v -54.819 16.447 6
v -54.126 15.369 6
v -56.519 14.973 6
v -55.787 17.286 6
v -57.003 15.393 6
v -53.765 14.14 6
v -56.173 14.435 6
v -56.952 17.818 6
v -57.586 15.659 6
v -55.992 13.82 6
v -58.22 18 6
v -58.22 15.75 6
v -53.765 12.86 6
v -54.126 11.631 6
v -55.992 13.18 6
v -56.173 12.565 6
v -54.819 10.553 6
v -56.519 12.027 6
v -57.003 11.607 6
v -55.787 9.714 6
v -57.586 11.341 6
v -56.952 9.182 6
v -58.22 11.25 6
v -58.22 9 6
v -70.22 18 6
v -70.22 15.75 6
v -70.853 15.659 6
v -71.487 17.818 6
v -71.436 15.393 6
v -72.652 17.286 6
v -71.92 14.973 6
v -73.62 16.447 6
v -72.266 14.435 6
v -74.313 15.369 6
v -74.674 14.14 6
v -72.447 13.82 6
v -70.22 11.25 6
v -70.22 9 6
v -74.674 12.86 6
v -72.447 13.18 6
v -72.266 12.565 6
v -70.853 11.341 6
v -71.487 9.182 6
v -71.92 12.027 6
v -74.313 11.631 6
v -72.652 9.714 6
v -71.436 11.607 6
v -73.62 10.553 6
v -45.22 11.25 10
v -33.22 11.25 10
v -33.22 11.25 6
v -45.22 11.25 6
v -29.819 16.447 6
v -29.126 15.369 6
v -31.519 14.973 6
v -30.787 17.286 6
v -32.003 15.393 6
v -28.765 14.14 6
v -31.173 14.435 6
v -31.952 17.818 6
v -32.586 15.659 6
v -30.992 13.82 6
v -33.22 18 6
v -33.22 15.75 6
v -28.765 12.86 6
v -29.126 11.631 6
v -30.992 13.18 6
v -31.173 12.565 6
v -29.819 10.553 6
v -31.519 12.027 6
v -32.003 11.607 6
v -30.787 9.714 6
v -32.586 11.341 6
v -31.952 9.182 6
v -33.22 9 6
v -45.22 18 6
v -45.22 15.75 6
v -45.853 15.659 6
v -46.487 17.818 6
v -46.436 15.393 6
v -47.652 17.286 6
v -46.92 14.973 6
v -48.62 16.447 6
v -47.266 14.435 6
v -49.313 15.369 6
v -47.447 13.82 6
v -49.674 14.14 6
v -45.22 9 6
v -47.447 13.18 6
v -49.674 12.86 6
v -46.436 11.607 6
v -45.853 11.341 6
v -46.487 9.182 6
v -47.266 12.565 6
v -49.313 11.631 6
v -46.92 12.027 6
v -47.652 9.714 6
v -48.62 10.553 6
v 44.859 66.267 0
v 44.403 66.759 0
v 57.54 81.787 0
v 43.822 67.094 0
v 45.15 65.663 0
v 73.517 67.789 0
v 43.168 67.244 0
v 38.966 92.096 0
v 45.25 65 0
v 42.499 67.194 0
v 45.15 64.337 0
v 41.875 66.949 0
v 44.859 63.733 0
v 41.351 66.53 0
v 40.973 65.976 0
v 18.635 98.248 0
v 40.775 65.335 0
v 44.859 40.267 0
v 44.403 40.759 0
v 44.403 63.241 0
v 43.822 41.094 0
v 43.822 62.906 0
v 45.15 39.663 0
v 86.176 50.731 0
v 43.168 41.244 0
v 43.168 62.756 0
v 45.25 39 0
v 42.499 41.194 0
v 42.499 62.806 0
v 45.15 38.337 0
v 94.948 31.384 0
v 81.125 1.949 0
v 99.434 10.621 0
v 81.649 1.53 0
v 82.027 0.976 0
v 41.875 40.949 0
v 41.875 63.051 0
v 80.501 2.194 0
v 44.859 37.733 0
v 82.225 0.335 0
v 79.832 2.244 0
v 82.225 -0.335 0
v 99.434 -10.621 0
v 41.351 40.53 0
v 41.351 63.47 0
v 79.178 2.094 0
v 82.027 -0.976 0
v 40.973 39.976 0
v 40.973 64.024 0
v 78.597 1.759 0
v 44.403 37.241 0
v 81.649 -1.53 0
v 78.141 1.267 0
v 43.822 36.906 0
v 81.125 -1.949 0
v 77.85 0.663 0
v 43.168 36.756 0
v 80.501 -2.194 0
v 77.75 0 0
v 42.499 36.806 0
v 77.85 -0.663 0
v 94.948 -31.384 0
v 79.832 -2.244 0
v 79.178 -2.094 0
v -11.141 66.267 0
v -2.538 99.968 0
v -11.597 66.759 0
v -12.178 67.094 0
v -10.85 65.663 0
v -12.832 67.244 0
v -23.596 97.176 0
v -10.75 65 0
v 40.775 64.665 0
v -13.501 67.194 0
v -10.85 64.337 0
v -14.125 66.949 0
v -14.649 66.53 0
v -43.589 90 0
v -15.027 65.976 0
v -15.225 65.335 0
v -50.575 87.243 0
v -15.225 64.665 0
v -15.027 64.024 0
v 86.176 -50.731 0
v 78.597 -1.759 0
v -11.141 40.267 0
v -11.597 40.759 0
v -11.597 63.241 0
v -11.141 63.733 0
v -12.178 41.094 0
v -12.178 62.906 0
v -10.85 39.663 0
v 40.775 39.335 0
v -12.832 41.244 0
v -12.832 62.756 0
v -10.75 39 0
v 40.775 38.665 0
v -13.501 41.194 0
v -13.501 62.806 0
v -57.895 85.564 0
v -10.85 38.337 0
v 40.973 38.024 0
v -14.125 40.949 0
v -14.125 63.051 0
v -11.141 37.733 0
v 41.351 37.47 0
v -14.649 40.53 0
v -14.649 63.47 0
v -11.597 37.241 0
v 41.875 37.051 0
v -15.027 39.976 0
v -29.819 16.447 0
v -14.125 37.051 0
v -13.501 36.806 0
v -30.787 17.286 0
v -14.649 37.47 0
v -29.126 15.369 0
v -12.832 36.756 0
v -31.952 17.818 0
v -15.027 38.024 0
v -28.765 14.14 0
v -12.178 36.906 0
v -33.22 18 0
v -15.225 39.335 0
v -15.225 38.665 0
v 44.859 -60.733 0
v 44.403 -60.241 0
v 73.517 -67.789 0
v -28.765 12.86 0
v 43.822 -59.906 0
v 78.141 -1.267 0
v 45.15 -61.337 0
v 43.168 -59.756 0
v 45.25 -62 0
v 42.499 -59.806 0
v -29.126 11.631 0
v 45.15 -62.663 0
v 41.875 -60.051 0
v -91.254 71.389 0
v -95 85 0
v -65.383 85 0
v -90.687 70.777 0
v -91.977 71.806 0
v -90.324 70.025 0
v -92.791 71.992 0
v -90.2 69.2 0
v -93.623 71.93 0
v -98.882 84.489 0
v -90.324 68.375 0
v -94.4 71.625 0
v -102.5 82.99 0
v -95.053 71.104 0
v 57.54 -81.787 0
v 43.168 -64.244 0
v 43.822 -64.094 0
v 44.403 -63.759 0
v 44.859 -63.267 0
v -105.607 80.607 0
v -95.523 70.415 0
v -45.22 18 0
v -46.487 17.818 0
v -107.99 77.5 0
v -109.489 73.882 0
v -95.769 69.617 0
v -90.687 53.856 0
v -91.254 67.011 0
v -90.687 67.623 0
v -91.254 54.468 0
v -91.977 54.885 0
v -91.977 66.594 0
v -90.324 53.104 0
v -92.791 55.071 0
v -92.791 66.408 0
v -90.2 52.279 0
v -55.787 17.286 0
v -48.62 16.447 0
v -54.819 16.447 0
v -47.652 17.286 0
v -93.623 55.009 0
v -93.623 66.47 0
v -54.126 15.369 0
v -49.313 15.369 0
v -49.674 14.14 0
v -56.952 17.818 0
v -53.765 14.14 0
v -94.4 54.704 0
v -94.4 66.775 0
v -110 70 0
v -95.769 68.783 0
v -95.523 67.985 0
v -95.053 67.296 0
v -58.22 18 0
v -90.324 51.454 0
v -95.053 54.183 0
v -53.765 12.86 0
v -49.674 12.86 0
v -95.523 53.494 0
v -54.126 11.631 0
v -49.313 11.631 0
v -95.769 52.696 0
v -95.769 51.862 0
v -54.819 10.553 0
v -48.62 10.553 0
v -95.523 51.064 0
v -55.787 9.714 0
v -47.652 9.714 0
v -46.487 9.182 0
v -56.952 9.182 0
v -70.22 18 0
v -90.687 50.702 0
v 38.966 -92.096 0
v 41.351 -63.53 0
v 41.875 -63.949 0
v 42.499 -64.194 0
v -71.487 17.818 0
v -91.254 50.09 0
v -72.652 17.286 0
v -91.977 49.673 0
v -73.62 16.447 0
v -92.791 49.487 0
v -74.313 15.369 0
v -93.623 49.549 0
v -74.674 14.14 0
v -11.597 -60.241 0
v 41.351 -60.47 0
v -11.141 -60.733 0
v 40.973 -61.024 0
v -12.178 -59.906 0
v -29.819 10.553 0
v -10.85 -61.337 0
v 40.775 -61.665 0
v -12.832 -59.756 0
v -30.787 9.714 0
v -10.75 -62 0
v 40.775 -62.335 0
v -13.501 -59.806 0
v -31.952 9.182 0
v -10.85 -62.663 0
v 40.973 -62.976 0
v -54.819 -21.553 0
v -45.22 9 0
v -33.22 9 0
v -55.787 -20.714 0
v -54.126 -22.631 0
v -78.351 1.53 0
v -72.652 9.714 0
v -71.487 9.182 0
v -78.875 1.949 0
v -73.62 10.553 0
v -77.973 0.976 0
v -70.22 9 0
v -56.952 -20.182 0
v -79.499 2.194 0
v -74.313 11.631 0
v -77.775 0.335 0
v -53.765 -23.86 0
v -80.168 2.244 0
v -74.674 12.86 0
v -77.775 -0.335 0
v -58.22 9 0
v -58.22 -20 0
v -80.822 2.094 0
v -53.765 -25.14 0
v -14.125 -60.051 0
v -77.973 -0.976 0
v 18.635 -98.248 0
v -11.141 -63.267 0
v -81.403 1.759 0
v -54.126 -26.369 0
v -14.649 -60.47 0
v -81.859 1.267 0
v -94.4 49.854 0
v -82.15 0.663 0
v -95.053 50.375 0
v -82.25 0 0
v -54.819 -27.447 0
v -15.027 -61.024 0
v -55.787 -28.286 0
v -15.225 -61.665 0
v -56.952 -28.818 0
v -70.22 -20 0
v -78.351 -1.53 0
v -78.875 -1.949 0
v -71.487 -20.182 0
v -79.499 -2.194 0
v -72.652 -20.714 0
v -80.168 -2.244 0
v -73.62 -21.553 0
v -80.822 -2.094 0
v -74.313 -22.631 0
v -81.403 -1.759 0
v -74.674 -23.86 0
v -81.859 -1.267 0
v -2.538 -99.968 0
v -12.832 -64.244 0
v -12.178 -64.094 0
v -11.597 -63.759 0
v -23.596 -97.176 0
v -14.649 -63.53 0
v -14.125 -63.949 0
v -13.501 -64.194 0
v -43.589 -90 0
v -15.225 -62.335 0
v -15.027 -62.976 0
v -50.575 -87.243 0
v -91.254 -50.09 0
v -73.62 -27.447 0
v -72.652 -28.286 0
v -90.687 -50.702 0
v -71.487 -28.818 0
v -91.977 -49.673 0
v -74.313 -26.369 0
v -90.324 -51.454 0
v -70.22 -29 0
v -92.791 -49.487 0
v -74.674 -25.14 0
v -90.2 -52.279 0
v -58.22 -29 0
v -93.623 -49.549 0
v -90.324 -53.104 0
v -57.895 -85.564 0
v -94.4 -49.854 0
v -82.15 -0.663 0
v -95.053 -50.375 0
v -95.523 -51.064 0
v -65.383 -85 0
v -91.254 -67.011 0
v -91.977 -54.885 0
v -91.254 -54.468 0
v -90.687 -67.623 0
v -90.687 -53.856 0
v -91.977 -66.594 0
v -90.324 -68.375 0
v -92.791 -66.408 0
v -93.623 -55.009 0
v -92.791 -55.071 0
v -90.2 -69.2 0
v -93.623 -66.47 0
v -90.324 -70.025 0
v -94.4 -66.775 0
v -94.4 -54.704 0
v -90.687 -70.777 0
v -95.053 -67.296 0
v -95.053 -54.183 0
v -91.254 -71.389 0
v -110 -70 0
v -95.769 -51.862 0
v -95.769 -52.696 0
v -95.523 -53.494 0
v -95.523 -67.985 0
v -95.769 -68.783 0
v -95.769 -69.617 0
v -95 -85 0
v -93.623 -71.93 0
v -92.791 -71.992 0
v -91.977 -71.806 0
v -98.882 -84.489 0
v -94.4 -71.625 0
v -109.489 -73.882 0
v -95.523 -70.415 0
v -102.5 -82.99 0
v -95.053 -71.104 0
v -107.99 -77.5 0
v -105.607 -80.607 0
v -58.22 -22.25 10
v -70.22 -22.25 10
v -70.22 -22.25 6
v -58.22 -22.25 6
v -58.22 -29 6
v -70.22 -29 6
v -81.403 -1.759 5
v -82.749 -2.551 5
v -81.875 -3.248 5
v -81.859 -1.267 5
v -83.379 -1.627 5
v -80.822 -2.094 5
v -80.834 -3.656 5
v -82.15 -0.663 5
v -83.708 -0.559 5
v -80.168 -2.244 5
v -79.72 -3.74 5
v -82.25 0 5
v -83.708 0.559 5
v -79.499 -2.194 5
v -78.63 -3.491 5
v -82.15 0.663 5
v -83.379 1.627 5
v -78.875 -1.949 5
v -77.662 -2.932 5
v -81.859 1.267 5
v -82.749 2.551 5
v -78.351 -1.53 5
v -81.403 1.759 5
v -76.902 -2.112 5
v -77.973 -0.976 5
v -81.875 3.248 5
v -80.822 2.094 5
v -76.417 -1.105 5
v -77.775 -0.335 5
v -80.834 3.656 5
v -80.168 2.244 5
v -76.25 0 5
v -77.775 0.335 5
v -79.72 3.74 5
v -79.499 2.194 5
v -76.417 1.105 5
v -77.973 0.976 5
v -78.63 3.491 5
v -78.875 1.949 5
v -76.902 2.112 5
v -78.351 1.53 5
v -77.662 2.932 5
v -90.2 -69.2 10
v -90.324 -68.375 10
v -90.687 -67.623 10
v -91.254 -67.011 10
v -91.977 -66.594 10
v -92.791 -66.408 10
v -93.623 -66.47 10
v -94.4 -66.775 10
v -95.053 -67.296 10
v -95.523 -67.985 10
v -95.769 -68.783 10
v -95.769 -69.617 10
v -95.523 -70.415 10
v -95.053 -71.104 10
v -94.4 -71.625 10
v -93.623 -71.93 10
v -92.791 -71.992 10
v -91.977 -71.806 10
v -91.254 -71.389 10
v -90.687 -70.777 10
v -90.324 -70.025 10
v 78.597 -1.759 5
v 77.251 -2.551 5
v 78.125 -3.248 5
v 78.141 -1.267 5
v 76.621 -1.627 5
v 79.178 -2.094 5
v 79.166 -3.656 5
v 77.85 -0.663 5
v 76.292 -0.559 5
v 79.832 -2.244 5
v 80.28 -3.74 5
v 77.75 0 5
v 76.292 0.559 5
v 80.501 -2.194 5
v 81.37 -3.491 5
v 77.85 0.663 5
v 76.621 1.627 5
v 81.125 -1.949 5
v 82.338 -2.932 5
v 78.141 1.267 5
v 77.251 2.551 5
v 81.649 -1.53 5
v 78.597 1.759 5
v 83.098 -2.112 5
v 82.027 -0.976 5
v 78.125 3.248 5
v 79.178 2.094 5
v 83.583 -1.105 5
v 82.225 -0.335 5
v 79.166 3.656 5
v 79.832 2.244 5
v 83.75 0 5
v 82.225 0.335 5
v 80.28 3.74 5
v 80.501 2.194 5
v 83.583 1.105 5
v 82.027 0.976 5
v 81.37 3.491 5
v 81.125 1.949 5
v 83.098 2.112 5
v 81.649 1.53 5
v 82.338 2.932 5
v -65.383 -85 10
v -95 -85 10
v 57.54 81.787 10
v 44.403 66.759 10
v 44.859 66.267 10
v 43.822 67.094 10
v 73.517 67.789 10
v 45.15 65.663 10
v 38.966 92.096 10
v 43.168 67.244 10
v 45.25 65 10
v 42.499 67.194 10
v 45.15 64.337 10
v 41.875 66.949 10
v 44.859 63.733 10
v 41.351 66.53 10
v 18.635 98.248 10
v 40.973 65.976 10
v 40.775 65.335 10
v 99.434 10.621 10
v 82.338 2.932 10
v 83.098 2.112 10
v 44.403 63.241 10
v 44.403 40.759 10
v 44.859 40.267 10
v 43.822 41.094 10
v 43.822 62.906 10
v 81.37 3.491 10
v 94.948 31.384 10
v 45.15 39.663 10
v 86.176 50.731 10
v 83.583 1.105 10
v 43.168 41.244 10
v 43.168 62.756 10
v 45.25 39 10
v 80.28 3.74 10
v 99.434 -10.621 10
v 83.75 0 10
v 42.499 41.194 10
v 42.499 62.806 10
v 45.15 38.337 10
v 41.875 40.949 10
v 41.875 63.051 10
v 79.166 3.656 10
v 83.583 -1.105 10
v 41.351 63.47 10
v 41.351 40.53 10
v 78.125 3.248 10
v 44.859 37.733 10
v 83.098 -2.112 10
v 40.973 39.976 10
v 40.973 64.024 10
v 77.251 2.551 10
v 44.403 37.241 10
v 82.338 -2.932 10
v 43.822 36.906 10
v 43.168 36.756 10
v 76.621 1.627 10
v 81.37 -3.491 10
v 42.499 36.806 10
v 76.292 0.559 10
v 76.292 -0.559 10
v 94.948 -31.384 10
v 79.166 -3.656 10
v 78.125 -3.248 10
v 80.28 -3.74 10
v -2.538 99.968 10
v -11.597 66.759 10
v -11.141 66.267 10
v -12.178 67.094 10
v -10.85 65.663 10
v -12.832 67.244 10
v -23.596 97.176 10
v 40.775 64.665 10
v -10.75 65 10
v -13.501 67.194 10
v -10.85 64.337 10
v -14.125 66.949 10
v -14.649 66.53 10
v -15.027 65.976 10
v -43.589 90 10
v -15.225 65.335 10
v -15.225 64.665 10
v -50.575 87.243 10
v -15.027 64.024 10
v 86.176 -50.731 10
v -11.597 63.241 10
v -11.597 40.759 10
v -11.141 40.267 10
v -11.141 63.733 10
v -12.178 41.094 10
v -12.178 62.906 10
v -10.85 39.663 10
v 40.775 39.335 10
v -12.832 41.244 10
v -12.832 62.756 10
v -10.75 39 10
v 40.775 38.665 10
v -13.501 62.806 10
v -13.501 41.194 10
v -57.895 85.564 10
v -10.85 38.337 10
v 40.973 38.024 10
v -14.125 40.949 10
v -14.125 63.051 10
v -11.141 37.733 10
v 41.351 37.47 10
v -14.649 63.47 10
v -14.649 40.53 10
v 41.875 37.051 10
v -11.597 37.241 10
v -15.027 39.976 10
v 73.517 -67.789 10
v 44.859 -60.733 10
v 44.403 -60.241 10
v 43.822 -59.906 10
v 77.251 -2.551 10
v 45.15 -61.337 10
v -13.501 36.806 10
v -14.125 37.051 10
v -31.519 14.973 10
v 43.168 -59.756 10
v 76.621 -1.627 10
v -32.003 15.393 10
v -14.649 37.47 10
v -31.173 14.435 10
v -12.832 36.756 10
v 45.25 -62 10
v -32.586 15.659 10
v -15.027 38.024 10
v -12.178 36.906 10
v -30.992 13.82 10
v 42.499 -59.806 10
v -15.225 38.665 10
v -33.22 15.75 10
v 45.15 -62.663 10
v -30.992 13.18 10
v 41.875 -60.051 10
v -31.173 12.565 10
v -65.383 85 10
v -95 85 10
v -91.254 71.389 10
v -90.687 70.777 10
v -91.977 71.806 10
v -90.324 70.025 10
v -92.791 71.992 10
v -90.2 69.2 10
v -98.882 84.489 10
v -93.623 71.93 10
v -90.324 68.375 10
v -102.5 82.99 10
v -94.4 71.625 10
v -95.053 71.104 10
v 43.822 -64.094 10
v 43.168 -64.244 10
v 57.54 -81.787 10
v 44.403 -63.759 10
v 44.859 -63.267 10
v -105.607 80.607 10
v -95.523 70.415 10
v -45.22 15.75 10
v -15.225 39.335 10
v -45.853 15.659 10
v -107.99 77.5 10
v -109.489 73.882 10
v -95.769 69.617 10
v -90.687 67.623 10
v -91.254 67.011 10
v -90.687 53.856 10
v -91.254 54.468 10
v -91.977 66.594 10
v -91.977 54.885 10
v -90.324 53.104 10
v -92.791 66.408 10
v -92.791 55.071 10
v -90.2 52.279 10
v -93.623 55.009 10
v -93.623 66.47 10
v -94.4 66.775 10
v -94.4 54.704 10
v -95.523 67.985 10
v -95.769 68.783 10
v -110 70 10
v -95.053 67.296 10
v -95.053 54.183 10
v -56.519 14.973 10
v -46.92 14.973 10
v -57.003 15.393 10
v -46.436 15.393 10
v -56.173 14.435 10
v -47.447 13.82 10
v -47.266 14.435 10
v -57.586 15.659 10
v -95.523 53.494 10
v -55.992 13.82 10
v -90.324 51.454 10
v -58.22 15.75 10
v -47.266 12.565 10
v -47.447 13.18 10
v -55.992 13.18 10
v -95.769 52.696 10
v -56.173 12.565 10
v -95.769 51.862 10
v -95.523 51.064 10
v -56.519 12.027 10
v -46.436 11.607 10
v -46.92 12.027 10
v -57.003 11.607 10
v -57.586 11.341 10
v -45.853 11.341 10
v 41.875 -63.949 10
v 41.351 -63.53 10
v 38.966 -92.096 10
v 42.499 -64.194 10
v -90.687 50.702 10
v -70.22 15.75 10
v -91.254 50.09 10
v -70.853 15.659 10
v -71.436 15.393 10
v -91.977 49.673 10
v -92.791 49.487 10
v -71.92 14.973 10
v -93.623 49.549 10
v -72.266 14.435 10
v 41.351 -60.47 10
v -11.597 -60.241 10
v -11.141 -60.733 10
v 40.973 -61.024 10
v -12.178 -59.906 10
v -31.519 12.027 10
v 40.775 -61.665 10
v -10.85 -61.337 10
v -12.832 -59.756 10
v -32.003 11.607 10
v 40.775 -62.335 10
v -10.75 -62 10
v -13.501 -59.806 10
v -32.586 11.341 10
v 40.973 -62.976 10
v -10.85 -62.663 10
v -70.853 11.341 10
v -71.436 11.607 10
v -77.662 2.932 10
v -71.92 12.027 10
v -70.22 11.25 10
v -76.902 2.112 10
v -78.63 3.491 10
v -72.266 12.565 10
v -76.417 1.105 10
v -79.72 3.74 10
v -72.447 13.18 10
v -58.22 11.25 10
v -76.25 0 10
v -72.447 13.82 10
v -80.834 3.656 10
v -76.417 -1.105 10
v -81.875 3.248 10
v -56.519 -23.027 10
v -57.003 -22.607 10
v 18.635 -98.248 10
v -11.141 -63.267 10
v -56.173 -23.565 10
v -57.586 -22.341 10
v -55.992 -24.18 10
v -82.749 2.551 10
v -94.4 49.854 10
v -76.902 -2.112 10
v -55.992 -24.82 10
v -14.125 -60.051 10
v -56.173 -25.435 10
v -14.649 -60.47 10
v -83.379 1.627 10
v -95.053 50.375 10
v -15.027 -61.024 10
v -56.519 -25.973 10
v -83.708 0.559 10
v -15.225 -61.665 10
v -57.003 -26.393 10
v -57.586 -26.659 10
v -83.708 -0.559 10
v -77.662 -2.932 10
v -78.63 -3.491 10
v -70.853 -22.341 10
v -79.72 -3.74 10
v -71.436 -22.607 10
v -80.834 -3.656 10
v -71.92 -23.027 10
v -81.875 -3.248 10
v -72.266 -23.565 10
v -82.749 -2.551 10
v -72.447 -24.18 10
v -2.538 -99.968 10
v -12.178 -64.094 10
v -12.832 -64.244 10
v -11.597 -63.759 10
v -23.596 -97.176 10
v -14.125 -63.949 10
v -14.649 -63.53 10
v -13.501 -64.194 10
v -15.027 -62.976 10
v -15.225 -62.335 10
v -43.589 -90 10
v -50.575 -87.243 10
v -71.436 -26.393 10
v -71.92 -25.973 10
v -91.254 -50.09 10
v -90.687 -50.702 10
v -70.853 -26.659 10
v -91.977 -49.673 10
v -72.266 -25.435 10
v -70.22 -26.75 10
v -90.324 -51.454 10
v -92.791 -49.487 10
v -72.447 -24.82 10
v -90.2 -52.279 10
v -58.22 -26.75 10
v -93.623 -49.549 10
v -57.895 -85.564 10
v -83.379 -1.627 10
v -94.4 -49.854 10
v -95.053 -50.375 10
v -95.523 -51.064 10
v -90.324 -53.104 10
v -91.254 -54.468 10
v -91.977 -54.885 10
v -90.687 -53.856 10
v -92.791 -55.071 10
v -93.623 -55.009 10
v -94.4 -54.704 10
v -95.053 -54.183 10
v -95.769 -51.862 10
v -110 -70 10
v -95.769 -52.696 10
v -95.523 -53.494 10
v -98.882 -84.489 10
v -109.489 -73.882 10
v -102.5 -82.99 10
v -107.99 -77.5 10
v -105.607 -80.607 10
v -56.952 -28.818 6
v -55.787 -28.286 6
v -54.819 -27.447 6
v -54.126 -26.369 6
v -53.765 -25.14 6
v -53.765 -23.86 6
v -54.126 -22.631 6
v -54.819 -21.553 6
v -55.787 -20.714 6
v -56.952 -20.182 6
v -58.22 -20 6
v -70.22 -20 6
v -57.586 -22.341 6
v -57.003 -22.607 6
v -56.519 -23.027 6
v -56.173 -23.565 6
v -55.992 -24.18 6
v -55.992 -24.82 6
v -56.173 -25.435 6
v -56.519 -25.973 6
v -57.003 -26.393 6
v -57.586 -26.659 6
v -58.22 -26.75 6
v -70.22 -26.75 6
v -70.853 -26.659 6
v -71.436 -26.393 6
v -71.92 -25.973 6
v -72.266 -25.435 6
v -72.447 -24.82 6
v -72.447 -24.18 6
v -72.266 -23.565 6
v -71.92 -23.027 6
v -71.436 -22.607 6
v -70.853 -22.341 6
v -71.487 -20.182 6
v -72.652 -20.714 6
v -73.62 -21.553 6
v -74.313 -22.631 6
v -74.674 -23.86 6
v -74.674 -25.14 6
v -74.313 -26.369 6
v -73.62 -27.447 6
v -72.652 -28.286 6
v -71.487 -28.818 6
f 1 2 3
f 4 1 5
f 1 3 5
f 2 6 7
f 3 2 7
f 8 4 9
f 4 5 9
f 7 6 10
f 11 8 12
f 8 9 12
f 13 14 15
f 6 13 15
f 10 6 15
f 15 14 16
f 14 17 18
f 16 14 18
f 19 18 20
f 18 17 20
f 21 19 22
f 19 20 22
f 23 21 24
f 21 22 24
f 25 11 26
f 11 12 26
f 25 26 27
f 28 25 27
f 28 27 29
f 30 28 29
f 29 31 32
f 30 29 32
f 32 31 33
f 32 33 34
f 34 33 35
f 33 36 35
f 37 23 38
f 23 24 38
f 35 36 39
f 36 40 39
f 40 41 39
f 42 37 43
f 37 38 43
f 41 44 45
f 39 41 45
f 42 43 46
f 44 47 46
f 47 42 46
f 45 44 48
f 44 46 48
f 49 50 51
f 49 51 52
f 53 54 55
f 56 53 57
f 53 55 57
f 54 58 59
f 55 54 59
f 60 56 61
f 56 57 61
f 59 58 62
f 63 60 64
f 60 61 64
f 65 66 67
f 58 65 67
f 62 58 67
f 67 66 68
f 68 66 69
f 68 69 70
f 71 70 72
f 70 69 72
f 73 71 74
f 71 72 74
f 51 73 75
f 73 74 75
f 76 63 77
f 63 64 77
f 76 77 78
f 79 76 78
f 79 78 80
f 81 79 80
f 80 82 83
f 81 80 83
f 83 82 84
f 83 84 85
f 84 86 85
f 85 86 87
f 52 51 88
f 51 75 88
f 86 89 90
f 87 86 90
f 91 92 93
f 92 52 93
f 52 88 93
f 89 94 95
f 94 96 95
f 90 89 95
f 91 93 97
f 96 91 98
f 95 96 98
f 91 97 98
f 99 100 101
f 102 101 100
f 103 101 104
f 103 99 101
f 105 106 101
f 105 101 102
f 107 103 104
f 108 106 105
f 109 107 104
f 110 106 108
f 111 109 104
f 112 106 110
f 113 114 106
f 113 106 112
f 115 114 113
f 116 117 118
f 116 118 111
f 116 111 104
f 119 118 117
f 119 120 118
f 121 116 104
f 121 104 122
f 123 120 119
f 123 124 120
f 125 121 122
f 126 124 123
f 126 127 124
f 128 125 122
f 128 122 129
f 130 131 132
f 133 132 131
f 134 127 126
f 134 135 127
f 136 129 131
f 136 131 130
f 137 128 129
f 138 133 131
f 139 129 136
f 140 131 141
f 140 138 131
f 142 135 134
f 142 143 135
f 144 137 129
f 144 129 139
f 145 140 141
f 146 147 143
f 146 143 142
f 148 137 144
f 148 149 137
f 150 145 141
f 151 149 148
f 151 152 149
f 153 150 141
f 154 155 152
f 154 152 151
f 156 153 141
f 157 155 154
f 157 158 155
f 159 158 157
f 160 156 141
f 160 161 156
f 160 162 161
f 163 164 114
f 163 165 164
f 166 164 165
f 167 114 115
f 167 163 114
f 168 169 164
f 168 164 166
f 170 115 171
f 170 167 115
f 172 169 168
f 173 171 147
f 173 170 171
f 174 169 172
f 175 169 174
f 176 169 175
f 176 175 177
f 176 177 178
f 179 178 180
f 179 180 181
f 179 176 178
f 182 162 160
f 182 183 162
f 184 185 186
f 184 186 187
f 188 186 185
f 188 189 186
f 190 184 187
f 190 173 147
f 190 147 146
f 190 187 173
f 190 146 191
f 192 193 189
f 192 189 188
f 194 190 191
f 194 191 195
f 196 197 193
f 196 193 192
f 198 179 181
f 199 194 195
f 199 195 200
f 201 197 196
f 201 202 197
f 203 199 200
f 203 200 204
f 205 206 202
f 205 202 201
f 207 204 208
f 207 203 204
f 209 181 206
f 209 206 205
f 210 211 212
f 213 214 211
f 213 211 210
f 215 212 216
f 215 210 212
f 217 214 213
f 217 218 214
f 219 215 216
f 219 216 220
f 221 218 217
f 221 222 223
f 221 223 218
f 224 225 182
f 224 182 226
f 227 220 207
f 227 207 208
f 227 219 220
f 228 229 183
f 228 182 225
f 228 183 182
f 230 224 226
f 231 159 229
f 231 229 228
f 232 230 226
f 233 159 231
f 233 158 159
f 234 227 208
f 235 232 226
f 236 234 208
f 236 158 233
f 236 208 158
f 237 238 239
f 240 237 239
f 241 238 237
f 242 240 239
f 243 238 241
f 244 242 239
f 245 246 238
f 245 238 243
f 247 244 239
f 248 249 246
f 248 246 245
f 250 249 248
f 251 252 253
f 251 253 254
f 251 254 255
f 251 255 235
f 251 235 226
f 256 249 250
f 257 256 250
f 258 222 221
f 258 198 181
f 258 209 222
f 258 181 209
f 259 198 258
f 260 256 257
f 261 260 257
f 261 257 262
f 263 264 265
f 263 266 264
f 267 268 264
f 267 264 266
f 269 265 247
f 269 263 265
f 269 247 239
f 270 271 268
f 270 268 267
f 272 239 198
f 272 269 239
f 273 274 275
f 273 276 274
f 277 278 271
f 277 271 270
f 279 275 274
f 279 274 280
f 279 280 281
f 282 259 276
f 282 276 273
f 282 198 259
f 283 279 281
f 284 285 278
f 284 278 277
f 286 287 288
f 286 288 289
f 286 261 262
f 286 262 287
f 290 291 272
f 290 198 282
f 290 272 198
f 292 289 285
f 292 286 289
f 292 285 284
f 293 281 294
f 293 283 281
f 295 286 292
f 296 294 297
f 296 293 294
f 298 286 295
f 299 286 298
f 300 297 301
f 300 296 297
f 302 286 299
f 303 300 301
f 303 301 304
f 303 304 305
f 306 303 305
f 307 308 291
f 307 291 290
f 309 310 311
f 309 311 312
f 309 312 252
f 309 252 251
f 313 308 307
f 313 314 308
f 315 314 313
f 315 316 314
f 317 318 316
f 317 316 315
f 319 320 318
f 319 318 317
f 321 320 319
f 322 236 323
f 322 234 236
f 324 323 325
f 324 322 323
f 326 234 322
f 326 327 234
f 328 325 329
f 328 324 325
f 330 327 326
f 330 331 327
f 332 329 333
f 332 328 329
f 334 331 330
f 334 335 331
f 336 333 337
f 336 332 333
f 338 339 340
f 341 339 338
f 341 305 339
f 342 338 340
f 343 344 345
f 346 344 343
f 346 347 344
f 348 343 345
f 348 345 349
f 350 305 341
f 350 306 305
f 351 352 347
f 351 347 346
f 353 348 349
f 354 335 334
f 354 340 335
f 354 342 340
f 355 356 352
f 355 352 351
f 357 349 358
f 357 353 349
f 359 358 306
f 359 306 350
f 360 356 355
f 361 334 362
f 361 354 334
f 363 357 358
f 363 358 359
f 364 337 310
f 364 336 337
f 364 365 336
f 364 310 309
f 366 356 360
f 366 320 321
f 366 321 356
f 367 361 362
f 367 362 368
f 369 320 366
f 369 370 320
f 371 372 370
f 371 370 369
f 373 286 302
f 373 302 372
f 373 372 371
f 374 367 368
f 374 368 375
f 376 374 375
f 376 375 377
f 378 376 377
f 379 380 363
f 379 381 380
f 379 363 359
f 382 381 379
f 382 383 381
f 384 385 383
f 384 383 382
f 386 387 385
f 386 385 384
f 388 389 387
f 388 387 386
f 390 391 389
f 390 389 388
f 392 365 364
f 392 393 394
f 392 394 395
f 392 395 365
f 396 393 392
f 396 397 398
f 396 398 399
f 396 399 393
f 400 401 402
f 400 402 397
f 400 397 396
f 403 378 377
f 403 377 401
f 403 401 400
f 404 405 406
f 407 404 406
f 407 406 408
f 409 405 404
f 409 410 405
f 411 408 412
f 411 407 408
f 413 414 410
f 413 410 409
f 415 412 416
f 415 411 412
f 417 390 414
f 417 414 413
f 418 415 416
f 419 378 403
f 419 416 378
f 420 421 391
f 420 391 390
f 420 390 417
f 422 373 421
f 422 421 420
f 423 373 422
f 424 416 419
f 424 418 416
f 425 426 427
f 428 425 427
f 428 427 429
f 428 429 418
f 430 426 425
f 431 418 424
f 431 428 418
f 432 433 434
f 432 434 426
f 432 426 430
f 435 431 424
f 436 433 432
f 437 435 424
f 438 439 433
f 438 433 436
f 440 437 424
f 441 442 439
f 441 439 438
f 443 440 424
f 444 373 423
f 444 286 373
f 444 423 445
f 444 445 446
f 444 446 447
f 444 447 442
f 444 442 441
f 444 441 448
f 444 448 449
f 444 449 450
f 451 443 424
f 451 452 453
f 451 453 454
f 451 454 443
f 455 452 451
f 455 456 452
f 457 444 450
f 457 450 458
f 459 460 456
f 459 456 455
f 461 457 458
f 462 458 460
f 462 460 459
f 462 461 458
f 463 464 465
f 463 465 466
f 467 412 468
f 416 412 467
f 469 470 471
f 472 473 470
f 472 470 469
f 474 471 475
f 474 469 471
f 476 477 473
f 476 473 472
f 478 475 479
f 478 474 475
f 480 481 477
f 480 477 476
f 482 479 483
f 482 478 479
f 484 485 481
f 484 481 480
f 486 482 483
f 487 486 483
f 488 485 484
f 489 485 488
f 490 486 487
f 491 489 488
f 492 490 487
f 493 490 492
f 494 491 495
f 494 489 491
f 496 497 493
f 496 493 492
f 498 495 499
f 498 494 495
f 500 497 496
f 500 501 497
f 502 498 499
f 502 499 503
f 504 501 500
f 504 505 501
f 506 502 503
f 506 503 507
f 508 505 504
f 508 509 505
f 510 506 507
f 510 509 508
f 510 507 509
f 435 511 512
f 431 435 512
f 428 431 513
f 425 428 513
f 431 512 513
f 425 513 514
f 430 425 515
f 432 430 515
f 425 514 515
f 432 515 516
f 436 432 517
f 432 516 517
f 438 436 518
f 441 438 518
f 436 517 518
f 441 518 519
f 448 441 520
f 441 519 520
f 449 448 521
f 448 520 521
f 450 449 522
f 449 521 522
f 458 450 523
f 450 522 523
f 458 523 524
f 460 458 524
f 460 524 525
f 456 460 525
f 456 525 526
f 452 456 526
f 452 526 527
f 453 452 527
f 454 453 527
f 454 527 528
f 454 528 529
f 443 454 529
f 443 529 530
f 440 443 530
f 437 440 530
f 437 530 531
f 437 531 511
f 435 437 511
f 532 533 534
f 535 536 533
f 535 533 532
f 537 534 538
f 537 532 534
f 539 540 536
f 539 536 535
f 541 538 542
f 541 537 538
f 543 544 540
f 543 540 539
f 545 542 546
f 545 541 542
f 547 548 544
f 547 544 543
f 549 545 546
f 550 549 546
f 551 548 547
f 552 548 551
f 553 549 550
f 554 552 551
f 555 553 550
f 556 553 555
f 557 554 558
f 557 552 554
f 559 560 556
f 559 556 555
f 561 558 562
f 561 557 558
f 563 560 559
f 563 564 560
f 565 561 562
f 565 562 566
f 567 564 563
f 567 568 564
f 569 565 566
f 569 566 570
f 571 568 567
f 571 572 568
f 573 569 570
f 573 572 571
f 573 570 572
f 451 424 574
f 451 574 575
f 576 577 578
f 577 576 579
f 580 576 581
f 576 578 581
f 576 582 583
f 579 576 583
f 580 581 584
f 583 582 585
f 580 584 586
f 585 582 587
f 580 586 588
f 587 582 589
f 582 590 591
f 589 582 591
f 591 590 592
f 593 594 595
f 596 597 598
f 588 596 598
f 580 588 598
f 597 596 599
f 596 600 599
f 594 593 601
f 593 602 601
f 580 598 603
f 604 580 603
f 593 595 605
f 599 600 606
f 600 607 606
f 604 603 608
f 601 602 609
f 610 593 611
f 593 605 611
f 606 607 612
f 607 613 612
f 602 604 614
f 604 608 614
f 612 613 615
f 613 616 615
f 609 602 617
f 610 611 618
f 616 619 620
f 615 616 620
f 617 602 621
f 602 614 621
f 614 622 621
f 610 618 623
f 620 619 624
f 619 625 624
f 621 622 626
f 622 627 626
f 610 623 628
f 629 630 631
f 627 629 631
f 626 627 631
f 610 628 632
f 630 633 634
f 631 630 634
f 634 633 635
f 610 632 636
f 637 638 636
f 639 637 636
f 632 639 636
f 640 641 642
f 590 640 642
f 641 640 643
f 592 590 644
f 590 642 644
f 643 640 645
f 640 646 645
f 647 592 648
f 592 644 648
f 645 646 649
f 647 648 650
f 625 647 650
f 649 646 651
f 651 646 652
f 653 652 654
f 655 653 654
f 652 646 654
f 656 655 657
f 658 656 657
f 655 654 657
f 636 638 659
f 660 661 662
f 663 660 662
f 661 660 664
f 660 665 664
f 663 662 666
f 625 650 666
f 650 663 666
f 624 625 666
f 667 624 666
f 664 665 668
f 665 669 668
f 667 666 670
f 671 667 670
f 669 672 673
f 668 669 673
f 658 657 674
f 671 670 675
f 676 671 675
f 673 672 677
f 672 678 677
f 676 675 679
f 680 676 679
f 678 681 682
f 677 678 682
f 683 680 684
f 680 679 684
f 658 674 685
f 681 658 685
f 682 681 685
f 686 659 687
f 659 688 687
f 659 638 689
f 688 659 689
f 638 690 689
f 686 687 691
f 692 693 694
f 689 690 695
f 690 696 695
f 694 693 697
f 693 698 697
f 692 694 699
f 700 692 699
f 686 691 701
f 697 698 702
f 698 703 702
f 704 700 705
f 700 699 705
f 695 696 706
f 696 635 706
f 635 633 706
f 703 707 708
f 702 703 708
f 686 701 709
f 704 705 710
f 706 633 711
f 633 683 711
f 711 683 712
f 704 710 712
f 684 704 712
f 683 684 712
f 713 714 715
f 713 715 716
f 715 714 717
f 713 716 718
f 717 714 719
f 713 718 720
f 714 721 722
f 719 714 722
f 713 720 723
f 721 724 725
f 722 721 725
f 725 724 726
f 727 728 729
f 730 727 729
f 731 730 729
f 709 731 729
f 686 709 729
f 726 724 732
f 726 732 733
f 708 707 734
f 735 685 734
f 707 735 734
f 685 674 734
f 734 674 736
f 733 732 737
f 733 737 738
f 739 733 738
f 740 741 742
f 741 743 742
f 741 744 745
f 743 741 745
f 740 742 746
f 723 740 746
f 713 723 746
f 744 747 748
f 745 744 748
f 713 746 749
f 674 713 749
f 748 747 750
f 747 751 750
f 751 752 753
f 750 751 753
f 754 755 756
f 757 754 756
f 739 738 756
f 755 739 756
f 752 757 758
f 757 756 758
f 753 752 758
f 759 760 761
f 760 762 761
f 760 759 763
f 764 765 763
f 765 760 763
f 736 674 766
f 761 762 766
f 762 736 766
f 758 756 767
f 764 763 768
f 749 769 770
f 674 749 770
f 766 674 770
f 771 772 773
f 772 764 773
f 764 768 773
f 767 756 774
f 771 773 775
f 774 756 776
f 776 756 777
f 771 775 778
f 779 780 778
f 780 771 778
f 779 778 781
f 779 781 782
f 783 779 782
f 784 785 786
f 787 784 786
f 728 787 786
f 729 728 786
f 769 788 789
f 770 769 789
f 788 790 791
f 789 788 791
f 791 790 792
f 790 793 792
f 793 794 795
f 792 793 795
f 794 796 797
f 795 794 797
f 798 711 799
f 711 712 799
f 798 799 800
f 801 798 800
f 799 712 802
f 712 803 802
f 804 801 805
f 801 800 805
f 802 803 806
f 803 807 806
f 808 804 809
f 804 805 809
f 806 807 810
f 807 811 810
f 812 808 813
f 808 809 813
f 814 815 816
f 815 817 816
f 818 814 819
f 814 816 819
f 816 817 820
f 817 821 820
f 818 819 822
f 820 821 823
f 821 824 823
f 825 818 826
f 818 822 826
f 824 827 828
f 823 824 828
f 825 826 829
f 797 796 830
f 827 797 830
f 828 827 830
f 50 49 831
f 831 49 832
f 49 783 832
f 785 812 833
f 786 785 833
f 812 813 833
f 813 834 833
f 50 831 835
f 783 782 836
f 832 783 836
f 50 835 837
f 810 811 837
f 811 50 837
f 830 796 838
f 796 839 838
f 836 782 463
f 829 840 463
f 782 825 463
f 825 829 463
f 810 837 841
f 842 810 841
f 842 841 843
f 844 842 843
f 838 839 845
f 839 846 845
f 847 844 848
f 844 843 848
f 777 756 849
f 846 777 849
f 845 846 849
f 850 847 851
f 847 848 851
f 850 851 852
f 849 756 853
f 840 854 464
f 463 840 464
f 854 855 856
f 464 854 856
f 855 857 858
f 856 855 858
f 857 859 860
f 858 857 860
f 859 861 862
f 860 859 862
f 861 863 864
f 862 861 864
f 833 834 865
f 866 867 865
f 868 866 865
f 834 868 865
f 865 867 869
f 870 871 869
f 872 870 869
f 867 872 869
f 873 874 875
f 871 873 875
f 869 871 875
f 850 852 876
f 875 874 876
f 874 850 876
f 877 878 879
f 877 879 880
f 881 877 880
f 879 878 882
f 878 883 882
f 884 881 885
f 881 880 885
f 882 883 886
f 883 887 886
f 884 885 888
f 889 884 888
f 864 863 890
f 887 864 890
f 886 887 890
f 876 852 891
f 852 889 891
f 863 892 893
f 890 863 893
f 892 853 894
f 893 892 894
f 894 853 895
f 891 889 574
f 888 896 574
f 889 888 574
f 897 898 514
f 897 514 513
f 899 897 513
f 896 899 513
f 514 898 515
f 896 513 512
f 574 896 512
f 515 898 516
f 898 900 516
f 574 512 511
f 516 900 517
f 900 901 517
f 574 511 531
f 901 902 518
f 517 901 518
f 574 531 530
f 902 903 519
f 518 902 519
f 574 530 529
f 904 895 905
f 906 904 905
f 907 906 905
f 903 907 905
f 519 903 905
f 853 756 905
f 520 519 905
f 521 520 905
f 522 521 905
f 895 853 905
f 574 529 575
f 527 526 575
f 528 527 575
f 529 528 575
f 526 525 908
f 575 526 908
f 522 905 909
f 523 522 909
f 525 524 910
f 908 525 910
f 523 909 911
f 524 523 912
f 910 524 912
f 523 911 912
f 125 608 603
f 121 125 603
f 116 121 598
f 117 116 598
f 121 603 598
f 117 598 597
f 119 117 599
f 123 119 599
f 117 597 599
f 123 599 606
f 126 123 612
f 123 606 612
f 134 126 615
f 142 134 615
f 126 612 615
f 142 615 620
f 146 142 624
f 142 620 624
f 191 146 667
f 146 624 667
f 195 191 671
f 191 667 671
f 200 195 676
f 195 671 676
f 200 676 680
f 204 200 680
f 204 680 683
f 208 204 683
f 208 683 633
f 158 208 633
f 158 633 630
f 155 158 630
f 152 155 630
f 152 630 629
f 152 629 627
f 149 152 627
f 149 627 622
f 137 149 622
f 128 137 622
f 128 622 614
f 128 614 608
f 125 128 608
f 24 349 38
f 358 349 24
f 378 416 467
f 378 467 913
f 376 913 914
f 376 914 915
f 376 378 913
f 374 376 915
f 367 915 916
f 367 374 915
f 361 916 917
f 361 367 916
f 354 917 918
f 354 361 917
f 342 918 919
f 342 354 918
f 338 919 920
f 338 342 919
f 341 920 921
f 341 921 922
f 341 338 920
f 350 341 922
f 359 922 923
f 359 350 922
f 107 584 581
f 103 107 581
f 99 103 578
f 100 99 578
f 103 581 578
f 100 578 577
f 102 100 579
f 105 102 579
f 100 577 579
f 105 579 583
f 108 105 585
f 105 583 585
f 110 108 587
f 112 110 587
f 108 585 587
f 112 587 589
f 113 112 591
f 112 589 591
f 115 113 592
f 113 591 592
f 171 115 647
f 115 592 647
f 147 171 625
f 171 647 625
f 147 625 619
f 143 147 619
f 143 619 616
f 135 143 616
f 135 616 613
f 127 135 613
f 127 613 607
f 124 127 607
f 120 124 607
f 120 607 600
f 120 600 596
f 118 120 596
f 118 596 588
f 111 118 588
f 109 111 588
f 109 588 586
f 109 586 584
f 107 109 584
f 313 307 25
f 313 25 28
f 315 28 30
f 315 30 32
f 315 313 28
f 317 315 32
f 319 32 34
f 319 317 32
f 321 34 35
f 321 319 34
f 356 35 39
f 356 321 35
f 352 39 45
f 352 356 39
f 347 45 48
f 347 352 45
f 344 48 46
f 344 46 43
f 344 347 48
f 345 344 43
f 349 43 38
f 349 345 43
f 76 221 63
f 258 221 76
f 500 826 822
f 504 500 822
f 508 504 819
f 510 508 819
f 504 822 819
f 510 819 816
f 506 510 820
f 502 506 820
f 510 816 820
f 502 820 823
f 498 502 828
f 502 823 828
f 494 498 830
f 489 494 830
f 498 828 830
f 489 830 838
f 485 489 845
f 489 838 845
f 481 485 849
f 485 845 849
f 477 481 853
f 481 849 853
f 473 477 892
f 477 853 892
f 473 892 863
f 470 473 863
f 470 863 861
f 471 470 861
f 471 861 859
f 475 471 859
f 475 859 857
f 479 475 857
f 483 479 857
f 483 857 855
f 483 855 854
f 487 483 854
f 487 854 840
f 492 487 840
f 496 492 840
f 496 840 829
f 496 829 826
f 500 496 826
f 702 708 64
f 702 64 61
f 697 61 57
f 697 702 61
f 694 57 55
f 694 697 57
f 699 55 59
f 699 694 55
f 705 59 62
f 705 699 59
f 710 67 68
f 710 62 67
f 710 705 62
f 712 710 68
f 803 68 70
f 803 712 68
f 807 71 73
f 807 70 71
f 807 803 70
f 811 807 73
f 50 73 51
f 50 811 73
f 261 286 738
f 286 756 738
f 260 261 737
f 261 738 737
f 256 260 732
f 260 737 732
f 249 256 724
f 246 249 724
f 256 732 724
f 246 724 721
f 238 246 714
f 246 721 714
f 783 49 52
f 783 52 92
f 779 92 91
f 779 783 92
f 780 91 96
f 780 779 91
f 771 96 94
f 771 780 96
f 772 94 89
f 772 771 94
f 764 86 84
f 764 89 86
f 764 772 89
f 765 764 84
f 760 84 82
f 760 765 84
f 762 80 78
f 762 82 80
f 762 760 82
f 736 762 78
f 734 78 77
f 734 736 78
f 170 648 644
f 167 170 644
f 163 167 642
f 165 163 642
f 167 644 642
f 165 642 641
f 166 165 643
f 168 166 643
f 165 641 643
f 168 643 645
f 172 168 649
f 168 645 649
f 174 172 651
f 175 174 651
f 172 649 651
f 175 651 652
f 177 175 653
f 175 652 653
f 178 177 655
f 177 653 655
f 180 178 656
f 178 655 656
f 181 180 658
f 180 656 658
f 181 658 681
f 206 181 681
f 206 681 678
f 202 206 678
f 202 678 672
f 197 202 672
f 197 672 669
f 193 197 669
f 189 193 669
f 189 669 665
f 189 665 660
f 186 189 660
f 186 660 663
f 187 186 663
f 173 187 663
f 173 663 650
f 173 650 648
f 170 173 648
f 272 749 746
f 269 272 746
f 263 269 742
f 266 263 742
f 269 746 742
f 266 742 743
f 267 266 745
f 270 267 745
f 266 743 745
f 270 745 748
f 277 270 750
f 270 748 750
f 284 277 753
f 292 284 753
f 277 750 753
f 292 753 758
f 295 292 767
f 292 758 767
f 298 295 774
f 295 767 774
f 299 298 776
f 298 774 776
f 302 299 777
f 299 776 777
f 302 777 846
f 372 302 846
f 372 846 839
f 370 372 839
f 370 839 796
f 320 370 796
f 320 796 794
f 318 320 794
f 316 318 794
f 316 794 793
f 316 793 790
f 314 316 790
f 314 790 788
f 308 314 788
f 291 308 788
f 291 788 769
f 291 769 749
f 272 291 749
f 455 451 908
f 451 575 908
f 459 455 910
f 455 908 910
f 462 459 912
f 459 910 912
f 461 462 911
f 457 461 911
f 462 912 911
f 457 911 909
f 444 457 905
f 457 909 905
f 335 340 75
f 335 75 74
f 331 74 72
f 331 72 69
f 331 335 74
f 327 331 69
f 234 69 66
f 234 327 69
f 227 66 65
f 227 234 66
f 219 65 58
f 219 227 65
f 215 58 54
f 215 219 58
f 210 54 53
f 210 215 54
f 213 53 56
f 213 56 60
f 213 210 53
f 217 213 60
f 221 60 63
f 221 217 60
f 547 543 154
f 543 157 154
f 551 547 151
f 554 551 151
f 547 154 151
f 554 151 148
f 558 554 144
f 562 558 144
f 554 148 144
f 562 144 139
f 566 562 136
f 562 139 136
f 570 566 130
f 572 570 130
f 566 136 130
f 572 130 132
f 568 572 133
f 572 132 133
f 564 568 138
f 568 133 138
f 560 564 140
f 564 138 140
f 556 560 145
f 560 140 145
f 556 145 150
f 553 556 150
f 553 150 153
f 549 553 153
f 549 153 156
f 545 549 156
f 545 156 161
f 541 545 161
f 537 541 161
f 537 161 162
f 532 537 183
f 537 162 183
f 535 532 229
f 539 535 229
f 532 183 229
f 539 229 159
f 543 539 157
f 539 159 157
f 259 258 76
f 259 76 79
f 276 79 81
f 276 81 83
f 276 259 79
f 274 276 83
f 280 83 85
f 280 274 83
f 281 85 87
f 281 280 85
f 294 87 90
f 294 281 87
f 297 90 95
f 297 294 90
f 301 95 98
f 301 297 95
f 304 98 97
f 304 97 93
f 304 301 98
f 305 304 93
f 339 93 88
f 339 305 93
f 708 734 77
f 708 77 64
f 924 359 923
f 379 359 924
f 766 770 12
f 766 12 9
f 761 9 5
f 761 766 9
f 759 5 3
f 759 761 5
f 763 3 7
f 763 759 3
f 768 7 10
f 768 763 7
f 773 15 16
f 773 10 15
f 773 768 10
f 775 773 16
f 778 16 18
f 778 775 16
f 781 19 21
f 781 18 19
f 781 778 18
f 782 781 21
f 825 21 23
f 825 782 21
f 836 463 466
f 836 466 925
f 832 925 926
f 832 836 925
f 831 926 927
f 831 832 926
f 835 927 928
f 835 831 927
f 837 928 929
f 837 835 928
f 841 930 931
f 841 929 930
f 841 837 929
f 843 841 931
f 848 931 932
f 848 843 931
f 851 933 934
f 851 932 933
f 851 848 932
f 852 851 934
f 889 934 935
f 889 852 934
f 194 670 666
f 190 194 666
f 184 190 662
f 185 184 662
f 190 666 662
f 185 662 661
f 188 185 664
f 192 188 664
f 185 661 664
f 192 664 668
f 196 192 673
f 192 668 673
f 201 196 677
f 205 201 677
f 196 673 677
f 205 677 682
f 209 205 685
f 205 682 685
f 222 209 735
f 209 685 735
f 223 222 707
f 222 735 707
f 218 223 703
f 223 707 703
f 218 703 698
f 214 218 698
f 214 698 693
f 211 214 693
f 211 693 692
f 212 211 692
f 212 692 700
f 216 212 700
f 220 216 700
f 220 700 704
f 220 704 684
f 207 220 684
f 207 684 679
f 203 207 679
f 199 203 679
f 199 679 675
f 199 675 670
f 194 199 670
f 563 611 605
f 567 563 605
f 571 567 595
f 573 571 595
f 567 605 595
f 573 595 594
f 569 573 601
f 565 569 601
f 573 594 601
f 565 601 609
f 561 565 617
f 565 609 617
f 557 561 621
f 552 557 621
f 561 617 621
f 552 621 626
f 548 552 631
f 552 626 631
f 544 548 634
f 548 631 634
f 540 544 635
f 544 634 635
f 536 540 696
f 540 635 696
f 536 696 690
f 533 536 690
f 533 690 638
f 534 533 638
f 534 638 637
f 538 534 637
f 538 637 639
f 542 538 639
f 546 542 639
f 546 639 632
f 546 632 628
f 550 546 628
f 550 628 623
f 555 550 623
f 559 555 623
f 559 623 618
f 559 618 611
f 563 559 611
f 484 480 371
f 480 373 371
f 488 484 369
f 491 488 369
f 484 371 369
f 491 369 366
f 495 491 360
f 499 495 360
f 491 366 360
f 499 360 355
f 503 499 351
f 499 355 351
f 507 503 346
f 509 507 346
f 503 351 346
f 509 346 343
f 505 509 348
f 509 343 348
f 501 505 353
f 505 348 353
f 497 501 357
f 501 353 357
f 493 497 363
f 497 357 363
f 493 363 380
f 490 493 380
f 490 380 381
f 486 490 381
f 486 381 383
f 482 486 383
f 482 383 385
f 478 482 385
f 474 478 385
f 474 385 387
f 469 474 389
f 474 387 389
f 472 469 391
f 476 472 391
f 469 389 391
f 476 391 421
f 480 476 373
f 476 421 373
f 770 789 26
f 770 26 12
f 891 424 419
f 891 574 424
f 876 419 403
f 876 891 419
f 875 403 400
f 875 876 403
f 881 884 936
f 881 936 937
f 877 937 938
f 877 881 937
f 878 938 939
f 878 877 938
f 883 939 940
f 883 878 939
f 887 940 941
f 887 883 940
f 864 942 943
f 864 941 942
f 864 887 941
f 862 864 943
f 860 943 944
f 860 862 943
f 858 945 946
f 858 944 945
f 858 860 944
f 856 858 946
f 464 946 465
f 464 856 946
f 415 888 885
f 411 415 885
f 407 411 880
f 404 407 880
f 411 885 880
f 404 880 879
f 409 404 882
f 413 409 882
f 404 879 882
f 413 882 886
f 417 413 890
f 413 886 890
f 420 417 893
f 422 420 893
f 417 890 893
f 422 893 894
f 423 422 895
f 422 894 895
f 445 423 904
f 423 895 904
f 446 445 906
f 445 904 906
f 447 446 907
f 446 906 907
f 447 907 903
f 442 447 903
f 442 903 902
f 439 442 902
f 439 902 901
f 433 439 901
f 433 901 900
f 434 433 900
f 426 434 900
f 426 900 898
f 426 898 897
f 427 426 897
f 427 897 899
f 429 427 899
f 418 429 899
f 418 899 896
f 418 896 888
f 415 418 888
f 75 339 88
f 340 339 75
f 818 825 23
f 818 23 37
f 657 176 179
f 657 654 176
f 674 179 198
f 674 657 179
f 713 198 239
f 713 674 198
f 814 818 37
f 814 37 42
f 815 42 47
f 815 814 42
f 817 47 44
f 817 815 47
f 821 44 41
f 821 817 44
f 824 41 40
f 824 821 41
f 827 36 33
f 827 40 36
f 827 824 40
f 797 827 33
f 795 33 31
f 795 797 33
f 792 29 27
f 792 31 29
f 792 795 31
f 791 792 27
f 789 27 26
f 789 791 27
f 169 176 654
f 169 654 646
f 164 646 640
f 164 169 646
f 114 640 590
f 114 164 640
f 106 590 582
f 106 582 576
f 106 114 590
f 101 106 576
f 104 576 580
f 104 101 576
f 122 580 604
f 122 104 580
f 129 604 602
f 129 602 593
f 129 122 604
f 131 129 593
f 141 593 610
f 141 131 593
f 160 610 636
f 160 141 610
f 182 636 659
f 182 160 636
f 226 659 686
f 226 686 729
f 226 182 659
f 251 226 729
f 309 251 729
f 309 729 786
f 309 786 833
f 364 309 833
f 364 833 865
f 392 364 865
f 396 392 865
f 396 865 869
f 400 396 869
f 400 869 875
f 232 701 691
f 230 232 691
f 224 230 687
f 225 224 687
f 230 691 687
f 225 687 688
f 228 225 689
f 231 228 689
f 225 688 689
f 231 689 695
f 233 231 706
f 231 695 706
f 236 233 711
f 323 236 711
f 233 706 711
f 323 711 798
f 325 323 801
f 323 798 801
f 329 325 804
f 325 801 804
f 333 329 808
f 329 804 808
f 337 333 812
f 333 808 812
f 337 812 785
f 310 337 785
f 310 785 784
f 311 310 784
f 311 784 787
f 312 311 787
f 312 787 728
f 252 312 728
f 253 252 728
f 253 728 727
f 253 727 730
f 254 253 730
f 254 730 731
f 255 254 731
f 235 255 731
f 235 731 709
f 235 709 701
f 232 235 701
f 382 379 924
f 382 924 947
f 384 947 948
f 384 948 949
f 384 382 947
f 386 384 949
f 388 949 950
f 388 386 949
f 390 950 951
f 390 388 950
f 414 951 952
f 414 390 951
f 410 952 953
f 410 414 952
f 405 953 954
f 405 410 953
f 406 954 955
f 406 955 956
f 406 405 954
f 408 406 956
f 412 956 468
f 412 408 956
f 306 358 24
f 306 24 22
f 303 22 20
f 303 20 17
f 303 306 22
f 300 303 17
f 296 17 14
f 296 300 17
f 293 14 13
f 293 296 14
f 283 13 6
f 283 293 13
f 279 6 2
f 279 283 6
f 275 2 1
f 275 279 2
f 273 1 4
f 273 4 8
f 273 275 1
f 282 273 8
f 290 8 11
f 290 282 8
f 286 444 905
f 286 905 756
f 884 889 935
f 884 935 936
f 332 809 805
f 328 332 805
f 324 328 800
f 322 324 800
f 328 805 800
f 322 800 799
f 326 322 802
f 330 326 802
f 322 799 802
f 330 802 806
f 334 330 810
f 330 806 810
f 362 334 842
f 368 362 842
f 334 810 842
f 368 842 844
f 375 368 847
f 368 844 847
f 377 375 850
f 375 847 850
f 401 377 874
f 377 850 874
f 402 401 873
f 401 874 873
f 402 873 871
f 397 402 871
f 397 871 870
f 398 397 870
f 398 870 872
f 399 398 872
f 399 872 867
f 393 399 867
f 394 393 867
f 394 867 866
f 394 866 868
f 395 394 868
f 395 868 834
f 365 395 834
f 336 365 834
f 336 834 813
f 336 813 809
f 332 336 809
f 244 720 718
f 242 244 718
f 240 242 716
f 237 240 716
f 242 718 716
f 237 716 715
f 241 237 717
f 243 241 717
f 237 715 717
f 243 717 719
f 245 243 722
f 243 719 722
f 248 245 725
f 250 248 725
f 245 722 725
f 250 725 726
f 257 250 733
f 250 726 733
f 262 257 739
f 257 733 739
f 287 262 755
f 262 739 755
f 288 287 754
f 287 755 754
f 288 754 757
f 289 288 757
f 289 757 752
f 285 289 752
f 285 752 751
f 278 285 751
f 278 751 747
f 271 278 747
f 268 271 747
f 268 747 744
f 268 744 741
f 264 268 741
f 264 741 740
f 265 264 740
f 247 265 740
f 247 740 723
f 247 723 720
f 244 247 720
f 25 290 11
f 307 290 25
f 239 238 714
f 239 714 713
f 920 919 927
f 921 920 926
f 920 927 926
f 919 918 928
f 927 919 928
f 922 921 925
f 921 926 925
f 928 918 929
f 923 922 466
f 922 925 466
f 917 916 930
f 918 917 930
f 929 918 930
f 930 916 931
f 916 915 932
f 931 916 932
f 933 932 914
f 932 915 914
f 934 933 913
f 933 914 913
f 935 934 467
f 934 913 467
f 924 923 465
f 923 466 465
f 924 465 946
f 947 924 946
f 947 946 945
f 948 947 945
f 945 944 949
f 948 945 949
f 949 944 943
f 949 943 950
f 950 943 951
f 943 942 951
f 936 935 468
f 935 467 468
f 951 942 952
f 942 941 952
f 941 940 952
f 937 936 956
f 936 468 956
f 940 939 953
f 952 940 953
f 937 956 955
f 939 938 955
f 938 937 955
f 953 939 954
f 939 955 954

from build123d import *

# Parameters (mm, degrees)
SALIENTE_EXTRUIR2_DEPTH                              = 10
REDONDEO3_R                                          = 15
REDONDEO5_R                                          = 50
CROQUIS4_R                                           = 2.8
CROQUIS4_R_2                                         = 2.25
CORTAR_EXTRUIR1_DEPTH                                = 149.996644258
REFRENTADO_PARA_TORNILLO_CON_CABEZA_TRON_D           = 4.5
REFRENTADO_PARA_TORNILLO_CON_CABEZA_TRON_CBORE_D     = 7.5
REFRENTADO_PARA_TORNILLO_CON_CABEZA_TRON_CBORE_DEPTH = 5
CORTAR_EXTRUIR2_DEPTH                                = 6


with BuildPart() as part:
    # Croquis2 → Saliente-Extruir2 (new body)
    with BuildSketch(Plane(origin=(0, 0, 0), x_dir=(0, 1, 0), z_dir=(0, 0, 1))):
        with BuildLine():
            Line((-85, 52.678268764), (-85, 110))
            Line((-85, 110), (85, 110))
            Line((85, 110), (85, 52.678268764))
            ThreePointArc((85, 52.678268764), (0, -100), (-85, 52.678268764))
        make_face()
    extrude(amount=SALIENTE_EXTRUIR2_DEPTH)

    # Redondeo3
    redondeo3_edges = [part.edges().sort_by_distance(p)[0] for p in [
        (-110, -85, 5),
        (-110, 85, 5),
    ]]
    fillet(redondeo3_edges, radius=REDONDEO3_R)

    # Redondeo5
    redondeo5_edges = [part.edges().sort_by_distance(p)[0] for p in [
        (-52.678268764, 85, 5),
        (-52.678268764, -85, 5),
    ]]
    fillet(redondeo5_edges, radius=REDONDEO5_R)

    # Croquis4 → Cortar-Extruir1 (cut, through all)
    with BuildSketch(Plane.XY.offset(10)):
        with Locations((-93, 69.2)):
            Circle(CROQUIS4_R)
        with Locations((-93, 52.279001067)):
            Circle(CROQUIS4_R)
        with Locations((-93, -52.279001068)):
            Circle(CROQUIS4_R)
        with Locations((-93, -69.2)):
            Circle(CROQUIS4_R)
        with Locations((-13, 39)):
            Circle(CROQUIS4_R_2)
        with Locations((43, 39)):
            Circle(CROQUIS4_R_2)
        with Locations((-13, 65)):
            Circle(CROQUIS4_R_2)
        with Locations((43, 65)):
            Circle(CROQUIS4_R_2)
        with Locations((-13, -62)):
            Circle(CROQUIS4_R_2)
        with Locations((43, -62)):
            Circle(CROQUIS4_R_2)
        with BuildLine():
            Line((-58.219532094, 11.25), (-70.219532094, 11.25))
            ThreePointArc((-70.219532094, 11.25), (-72.469532094, 13.5), (-70.219532094, 15.75))
            Line((-70.219532094, 15.75), (-58.219532094, 15.75))
            ThreePointArc((-58.219532094, 15.75), (-55.969532094, 13.5), (-58.219532094, 11.25))
        make_face()
        with BuildLine():
            Line((-33.219532094, 11.25), (-45.219532094, 11.25))
            ThreePointArc((-45.219532094, 11.25), (-47.469532094, 13.5), (-45.219532094, 15.75))
            Line((-45.219532094, 15.75), (-33.219532094, 15.75))
            ThreePointArc((-33.219532094, 15.75), (-30.969532094, 13.5), (-33.219532094, 11.25))
        make_face()
        with BuildLine():
            Line((-58.219532094, -26.75), (-70.219532094, -26.75))
            ThreePointArc((-70.219532094, -26.75), (-72.469532094, -24.5), (-70.219532094, -22.25))
            Line((-70.219532094, -22.25), (-58.219532094, -22.25))
            ThreePointArc((-58.219532094, -22.25), (-55.969532094, -24.5), (-58.219532094, -26.75))
        make_face()
    extrude(amount=-CORTAR_EXTRUIR1_DEPTH, mode=Mode.SUBTRACT)

    # Refrentado para tornillo con cabeza tron (through all)
    with Locations(Plane.XY.offset(10)):
        with Locations((-80, 0), (80, 0)):
            CounterBoreHole(REFRENTADO_PARA_TORNILLO_CON_CABEZA_TRON_D / 2, REFRENTADO_PARA_TORNILLO_CON_CABEZA_TRON_CBORE_D / 2, REFRENTADO_PARA_TORNILLO_CON_CABEZA_TRON_CBORE_DEPTH)

    # Croquis7 → Cortar-Extruir2 (cut)
    with BuildSketch(Plane(origin=(0, 0, 0), x_dir=(1, 0, 0), z_dir=(0, 0, -1))):
        with BuildLine():
            Line((-70.219532094, 29), (-58.219532094, 29))
            ThreePointArc((-58.219532094, 29), (-53.719532094, 24.5), (-58.219532094, 20))
            Line((-58.219532094, 20), (-70.219532094, 20))
            ThreePointArc((-70.219532094, 20), (-74.719532094, 24.5), (-70.219532094, 29))
        make_face()
        with BuildLine():
            Line((-70.219532094, -9), (-58.219532094, -9))
            ThreePointArc((-58.219532094, -9), (-53.719532094, -13.5), (-58.219532094, -18))
            Line((-58.219532094, -18), (-70.219532094, -18))
            ThreePointArc((-70.219532094, -18), (-74.719532094, -13.5), (-70.219532094, -9))
        make_face()
        with BuildLine():
            Line((-45.219532094, -9), (-33.219532094, -9))
            ThreePointArc((-33.219532094, -9), (-28.719532094, -13.5), (-33.219532094, -18))
            Line((-33.219532094, -18), (-45.219532094, -18))
            ThreePointArc((-45.219532094, -18), (-49.719532094, -13.5), (-45.219532094, -9))
        make_face()
    extrude(amount=-CORTAR_EXTRUIR2_DEPTH, mode=Mode.SUBTRACT)


solid = part.part
